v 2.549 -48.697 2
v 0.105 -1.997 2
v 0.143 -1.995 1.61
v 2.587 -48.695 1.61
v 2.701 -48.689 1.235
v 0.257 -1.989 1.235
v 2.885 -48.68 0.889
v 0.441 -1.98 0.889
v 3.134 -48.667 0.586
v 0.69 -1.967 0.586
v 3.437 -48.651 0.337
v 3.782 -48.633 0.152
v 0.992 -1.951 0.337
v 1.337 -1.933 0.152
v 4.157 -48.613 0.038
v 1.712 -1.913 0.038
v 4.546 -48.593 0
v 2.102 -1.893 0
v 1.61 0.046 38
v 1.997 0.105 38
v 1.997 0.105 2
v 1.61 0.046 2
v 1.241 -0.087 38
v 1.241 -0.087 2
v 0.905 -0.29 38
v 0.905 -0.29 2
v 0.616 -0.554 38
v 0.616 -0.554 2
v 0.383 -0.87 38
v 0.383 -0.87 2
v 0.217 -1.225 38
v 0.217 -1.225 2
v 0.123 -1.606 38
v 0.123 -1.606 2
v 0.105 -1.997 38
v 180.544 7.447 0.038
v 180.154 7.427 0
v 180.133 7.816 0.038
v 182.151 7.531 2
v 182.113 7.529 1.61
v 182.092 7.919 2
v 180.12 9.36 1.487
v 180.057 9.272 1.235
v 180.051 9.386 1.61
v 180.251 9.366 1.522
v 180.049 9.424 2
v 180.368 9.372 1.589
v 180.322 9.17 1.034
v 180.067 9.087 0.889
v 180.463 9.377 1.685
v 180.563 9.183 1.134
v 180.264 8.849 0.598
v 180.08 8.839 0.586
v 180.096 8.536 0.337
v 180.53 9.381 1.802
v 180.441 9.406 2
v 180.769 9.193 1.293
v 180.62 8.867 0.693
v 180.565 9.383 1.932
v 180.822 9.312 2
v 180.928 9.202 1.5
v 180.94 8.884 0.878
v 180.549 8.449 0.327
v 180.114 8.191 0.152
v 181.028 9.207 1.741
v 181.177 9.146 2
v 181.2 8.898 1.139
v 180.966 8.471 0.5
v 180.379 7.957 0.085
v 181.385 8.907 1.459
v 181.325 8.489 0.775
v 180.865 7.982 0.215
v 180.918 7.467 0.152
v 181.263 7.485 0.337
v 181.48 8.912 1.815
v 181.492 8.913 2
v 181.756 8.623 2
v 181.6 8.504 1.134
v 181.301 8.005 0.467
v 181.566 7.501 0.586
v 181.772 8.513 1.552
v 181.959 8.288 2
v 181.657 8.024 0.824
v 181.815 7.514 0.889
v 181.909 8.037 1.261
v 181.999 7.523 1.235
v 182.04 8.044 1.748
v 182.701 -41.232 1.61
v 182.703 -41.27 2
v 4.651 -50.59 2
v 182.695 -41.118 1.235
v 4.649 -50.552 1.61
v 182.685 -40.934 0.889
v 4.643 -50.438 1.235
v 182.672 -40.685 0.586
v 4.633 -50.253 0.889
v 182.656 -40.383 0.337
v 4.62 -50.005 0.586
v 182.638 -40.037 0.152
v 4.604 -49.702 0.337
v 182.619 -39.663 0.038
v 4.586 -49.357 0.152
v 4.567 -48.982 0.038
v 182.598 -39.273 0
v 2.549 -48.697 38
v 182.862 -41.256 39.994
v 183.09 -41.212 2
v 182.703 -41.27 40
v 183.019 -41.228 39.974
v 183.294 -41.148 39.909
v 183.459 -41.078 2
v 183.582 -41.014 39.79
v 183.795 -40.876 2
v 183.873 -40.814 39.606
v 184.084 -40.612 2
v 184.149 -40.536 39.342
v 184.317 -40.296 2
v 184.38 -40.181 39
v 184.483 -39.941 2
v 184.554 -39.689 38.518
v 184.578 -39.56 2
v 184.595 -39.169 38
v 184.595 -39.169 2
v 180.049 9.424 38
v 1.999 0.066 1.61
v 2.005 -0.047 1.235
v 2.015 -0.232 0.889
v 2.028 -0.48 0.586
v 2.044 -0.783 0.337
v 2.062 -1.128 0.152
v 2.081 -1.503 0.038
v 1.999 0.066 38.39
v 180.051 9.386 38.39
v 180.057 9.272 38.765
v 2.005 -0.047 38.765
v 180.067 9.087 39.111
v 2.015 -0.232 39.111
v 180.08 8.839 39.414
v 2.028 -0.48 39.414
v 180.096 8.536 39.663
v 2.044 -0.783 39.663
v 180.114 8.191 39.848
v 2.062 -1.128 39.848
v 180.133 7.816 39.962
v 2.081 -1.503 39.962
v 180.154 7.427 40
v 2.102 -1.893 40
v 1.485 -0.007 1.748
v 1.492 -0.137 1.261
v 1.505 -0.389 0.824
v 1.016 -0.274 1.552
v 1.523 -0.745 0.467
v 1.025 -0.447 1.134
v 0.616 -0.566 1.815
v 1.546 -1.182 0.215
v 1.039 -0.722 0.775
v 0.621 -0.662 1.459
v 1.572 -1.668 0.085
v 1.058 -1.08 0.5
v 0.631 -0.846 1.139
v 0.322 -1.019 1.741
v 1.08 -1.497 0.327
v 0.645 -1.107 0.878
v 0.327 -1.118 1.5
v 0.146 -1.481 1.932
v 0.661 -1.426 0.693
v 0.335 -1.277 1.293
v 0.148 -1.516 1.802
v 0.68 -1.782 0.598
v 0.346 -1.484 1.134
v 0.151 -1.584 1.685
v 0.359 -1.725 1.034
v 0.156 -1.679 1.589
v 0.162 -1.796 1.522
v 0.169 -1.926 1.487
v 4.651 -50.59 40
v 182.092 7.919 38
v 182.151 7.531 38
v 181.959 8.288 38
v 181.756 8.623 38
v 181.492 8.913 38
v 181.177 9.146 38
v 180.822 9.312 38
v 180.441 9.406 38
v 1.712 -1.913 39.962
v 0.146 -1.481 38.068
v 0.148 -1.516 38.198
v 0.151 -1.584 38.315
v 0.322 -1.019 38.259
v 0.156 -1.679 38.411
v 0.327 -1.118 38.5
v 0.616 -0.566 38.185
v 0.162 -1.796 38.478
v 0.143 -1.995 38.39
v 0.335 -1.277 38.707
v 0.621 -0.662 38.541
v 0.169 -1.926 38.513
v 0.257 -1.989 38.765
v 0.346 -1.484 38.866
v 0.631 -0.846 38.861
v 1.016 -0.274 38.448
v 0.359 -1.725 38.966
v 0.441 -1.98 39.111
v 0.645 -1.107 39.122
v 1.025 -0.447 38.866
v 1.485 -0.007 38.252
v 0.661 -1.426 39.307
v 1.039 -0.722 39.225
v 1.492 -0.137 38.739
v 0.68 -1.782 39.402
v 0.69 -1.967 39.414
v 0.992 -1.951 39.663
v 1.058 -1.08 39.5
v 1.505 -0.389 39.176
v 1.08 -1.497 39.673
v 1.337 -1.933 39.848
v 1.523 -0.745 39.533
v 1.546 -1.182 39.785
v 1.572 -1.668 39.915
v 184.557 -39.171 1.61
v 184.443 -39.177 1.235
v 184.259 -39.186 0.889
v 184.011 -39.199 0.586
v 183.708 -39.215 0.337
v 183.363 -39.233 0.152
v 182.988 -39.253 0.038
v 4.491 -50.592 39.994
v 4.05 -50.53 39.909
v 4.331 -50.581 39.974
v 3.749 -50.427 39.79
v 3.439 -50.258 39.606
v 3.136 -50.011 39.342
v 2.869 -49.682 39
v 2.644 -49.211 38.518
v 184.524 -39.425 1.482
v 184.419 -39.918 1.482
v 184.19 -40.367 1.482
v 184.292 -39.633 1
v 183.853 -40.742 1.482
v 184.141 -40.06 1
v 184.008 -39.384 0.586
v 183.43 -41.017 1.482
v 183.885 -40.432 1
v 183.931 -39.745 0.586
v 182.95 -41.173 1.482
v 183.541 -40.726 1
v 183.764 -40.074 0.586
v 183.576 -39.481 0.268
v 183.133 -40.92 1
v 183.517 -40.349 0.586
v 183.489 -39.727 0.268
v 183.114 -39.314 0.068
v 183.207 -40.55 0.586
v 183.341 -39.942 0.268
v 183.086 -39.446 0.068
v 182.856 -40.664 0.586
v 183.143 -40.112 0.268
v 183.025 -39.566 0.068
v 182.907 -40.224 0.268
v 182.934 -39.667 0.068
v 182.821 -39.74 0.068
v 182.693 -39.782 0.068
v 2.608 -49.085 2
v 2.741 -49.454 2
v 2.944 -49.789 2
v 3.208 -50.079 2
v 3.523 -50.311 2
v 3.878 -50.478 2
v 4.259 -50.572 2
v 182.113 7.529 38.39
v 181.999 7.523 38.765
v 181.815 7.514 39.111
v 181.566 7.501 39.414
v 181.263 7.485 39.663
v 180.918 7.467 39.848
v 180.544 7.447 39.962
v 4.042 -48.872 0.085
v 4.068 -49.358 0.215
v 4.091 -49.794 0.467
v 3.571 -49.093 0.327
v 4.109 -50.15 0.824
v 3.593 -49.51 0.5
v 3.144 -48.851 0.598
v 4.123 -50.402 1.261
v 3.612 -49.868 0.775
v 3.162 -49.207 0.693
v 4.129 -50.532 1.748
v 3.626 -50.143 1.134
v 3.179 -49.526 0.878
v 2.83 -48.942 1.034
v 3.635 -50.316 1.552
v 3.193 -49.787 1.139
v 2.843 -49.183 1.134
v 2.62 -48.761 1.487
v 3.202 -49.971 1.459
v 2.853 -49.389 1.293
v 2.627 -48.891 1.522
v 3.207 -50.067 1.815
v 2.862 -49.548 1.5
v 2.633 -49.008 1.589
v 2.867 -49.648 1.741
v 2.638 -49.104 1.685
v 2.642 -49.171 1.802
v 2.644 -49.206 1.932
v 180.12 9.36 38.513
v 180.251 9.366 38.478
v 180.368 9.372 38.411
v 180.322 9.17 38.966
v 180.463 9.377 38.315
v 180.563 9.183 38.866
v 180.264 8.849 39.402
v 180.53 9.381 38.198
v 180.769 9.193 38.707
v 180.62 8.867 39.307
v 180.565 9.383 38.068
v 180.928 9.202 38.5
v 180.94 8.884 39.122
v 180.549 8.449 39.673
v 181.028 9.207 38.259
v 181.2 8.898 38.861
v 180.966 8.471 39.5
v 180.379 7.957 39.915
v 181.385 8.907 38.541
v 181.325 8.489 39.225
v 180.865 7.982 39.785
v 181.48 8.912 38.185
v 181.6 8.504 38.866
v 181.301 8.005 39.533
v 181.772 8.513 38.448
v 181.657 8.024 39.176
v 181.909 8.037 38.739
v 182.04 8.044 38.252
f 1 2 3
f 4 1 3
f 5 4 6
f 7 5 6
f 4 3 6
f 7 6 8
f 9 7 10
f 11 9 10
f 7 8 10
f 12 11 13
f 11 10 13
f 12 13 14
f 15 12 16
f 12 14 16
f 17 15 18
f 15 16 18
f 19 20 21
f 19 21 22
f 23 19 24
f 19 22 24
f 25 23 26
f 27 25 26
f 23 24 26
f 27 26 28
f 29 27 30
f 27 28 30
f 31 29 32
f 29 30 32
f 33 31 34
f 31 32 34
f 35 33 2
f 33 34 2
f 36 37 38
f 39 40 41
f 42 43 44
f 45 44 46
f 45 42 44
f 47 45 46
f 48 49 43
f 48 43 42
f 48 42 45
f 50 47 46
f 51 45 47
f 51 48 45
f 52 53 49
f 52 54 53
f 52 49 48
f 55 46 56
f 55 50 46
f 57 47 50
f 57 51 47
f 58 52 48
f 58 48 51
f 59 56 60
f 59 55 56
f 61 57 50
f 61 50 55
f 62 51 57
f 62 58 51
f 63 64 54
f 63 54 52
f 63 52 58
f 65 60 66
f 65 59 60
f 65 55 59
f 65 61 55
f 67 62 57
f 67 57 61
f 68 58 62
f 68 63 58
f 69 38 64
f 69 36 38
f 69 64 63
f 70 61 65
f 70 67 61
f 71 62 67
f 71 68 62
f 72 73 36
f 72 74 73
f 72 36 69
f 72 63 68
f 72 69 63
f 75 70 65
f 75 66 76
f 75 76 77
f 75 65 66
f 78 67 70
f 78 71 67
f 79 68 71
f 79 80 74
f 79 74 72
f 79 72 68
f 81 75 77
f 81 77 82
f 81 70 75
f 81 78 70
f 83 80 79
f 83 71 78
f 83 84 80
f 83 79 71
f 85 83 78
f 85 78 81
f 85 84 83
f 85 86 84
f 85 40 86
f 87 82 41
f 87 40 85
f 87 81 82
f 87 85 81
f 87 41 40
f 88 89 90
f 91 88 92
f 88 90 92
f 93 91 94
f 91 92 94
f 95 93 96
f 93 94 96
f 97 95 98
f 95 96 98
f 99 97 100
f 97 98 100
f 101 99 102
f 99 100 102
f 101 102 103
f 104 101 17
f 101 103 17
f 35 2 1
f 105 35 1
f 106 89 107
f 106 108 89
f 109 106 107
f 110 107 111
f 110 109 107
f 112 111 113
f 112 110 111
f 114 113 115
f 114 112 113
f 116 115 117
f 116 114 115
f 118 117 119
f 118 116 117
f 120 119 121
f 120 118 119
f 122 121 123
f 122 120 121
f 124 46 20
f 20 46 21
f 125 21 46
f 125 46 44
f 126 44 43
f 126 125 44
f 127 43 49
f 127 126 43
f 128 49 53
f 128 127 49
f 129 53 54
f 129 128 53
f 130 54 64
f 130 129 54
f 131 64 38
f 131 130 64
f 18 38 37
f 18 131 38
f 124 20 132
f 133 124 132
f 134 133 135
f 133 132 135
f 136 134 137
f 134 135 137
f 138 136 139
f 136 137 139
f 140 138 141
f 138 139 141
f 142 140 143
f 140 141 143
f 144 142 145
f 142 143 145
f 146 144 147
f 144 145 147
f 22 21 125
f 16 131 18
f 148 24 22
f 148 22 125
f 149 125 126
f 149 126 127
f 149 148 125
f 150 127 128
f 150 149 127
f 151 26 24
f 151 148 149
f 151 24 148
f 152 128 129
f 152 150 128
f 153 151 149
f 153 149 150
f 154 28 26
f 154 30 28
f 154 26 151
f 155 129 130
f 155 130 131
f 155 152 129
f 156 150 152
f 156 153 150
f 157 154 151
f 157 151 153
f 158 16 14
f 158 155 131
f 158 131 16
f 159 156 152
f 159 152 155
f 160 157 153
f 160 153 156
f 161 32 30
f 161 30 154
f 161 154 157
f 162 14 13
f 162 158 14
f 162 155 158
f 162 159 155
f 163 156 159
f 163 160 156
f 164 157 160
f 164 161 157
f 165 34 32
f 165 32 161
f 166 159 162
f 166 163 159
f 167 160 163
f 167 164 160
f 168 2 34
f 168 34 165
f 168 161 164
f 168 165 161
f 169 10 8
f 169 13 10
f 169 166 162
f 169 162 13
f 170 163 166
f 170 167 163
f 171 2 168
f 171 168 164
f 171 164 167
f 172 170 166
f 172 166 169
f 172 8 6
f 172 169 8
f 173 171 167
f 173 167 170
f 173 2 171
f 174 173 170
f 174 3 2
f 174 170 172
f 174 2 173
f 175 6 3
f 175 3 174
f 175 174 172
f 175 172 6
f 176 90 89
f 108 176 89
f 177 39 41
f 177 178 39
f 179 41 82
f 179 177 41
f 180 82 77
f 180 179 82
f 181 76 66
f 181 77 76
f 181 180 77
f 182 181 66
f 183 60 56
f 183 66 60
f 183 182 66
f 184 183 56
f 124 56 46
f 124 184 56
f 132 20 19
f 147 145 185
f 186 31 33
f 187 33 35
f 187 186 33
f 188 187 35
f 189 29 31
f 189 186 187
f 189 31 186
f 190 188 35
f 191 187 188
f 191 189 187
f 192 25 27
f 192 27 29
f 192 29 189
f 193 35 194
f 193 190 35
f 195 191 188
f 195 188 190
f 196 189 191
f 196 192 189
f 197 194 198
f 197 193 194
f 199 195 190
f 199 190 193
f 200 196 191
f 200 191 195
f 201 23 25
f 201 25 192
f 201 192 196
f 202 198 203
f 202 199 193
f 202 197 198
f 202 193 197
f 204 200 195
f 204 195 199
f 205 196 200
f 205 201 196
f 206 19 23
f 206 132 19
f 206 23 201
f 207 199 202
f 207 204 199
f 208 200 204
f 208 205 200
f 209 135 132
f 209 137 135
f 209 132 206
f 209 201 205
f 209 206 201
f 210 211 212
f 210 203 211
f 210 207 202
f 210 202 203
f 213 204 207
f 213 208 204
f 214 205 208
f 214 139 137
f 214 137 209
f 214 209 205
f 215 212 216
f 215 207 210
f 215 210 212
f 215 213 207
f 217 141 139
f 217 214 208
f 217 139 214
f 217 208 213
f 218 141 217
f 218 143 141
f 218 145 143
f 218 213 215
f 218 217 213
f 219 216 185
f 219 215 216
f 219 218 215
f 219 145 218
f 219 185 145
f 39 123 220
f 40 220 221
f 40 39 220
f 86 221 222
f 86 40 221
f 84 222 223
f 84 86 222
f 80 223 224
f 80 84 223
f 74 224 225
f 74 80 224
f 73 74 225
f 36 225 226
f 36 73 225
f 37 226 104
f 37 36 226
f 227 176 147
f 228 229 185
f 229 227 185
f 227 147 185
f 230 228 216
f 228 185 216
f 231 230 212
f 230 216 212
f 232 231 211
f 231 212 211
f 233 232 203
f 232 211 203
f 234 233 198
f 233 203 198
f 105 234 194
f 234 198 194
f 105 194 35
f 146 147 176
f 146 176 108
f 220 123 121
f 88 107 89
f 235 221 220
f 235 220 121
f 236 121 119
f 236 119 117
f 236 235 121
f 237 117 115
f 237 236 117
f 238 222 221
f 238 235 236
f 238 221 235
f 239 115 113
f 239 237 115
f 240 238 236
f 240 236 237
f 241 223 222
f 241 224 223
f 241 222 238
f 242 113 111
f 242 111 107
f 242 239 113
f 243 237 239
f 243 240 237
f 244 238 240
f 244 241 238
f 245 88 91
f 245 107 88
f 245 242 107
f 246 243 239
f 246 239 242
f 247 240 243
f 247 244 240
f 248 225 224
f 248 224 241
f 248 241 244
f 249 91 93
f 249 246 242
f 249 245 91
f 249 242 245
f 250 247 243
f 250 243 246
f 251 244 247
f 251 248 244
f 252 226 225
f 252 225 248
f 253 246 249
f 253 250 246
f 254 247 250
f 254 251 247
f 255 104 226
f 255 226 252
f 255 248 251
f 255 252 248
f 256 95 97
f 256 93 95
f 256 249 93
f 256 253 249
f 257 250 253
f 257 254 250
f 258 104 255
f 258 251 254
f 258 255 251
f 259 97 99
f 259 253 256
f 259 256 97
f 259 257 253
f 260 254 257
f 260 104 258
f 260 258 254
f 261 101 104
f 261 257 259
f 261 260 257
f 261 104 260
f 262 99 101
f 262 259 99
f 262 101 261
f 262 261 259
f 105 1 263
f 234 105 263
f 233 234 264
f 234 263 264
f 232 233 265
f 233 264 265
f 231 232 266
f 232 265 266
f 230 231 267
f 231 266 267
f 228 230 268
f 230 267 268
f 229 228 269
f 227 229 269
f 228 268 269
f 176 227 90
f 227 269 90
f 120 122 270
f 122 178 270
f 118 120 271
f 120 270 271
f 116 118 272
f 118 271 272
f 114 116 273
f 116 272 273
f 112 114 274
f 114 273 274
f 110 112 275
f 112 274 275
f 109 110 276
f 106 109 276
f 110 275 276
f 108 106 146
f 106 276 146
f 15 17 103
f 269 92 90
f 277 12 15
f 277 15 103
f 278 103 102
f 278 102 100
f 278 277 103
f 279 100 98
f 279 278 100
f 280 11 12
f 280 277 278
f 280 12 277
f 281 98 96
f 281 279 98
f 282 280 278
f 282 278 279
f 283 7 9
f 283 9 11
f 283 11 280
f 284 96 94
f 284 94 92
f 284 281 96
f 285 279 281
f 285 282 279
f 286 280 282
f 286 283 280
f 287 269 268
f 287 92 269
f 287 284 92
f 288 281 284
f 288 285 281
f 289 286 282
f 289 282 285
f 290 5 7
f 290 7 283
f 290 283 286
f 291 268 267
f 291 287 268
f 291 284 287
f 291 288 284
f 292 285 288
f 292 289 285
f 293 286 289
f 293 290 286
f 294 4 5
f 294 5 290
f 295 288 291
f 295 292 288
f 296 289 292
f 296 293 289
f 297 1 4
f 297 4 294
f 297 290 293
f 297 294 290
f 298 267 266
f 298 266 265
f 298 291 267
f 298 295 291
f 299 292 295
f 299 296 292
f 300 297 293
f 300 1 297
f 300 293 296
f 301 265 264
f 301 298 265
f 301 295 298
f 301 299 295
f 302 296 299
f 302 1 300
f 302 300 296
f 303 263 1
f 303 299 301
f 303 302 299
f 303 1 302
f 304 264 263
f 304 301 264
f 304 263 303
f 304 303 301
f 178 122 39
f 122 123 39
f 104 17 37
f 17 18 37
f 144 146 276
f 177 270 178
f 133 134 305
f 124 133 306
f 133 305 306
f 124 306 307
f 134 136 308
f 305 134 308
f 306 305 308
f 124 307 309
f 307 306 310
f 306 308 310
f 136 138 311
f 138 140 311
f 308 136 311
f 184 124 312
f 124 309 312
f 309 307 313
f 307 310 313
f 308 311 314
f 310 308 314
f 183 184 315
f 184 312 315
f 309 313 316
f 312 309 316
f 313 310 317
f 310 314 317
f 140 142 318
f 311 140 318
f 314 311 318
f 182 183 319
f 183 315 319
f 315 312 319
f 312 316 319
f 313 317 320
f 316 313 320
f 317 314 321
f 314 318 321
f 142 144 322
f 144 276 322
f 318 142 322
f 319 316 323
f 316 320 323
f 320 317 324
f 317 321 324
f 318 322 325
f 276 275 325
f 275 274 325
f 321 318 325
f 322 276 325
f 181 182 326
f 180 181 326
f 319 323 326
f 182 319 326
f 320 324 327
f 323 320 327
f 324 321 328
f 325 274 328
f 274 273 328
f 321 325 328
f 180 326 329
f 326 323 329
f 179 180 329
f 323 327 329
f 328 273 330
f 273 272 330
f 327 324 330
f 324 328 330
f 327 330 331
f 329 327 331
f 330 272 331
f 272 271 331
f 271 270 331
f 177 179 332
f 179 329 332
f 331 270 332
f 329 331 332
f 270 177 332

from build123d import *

# Parameters (mm, degrees)
BOSS_EXTRUDE1_DEPTH = 40
FILLET1_R           = 2
FILLET2_R           = 2


with BuildPart() as part:
    # Sketch1 → Boss-Extrude1 (new body)
    with BuildSketch(Plane.XY):
        Polygon((0, 0), (2.6534308254274332, -50.694494191060826), (184.70003032872677, -41.165884299703535), (182.04659950329932, 9.528609891357288), align=None)
    extrude(amount=BOSS_EXTRUDE1_DEPTH)

    # Fillet1
    fillet1_edges = [part.edges().sort_by_distance(p)[0] for p in [
        (183.37331491601304, -15.818637204173122, 40),
        (91.02329975164966, 4.764304945678644, 40),
        (183.37331491601304, -15.818637204173122, 0),
        (91.02329975164966, 4.764304945678644, 0),
        (182.04659950329932, 9.528609891357288, 20),
        (184.70003032872677, -41.165884299703535, 20),
    ]]
    fillet(fillet1_edges, radius=FILLET1_R)

    # Fillet2
    # the kernel refuses this fillet: 2 mm, written as the material it takes off along each edge
    with BuildSketch(Plane(origin=(182.59822426289585, -39.27315841843169, 2), x_dir=(0.052270046139774824, -0.9986329867756952, 0), z_dir=(0, 0, -1))) as fillet2_piece_1_section:
        Polygon((0, 0), (FILLET2_R, 0), (FILLET2_R, -FILLET2_R), (-6.3e-16, -FILLET2_R), align=None)
    fillet2_piece_1 = extrude(amount=FILLET2_R, mode=Mode.PRIVATE)
    fillet2_piece_1 = fillet2_piece_1 - Plane(origin=(182.59822426289585, -39.27315841843169, 2), x_dir=(-0.7431006609440385, 0.6691796527873013, 0), z_dir=(0, 0, -1)) * Sphere(FILLET2_R, mode=Mode.PRIVATE)
    add(fillet2_piece_1, mode=Mode.SUBTRACT)
    with BuildSketch(Plane(origin=(4.546156706699275, -48.5926881252299, 2), x_dir=(0, 0, -1), z_dir=(-0.9986329867756953, -0.052270046139774824, 0))) as fillet2_piece_2_section:
        Polygon((0, 0), (FILLET2_R, 0), (FILLET2_R, FILLET2_R), (0, FILLET2_R), align=None)
    fillet2_piece_2 = extrude(amount=FILLET2_R, mode=Mode.PRIVATE)
    fillet2_piece_2 = fillet2_piece_2 - Plane(origin=(4.546156706699275, -48.5926881252299, 2), x_dir=(-0.0369605040783685, 0.7061401568656699, 0.7071067811865475), z_dir=(-0.9986329867756953, -0.052270046139774824, 0)) * Sphere(FILLET2_R, mode=Mode.PRIVATE)
    add(fillet2_piece_2, mode=Mode.SUBTRACT)
    with BuildSketch(Plane(origin=(0.1045400922795495, -1.9972659735513878, 0), x_dir=(-5e-17, 0, 1), z_dir=(0.052270046139774824, -0.9986329867756953, 0))) as fillet2_piece_3:
        with BuildLine():
            CenterArc((FILLET2_R, -FILLET2_R), FILLET2_R, 90, 90.00000000000006)
            Line((-3.3e-16, -FILLET2_R), (0, 0))
            Line((0, 0), (FILLET2_R, 0))
        make_face()
    extrude(amount=46.76388909877601, mode=Mode.SUBTRACT)
    with BuildSketch(Plane(origin=(0.1045400922795495, -1.9972659735513878, 40), x_dir=(-5e-17, 0, -1), z_dir=(0.052270046139774824, -0.9986329867756953, 0))) as fillet2_piece_4:
        with BuildLine():
            CenterArc((FILLET2_R, FILLET2_R), FILLET2_R, 179.99999999999994, 90.00000000000006)
            Line((-1.1e-16, FILLET2_R), (0, 0))
            Line((0, 0), (FILLET2_R, 0))
        make_face()
    extrude(amount=53.763889098776026, mode=Mode.SUBTRACT)
    with BuildSketch(Plane(origin=(0, 0, 1.9999999999999996), x_dir=(0.052270046139775025, -0.9986329867756953, 0), z_dir=(0, 0, 1))) as fillet2_piece_5:
        with BuildLine():
            CenterArc((FILLET2_R, FILLET2_R), FILLET2_R, 180.00000000000034, 89.99999999999966)
            Line((9e-16, FILLET2_R), (0, 0))
            Line((0, 0), (FILLET2_R, 0))
        make_face()
    extrude(amount=36, mode=Mode.SUBTRACT)
    with BuildSketch(Plane(origin=(0.1045400922795352, -1.9972659735513885, 38), x_dir=(-0.05227004613977481, 0.9986329867756952, 0), z_dir=(0, 0, -1))) as fillet2_piece_6:
        with BuildLine():
            CenterArc((2 - FILLET2_R, FILLET2_R), FILLET2_R, 270, 89.99999999999885)
            Line((1.9999999999999998, FILLET2_R), (2, 0))
            Line((2, 0), (2 - FILLET2_R, 1.42e-14))
        make_face()
    revolve(axis=Axis((0.1045400922795352, -1.9972659735513885, 38), (0.9986329867756952, 0.05227004613977481, 0)), revolution_arc=90, mode=Mode.SUBTRACT)
    with BuildSketch(Plane(origin=(0.1045400922795352, -1.9972659735513885, 1.9999999999999996), x_dir=(-0.05227004613977481, 0.9986329867756952, 0), z_dir=(1e-17, -1.1e-16, 1))) as fillet2_piece_7:
        with BuildLine():
            CenterArc((2 - FILLET2_R, -FILLET2_R), FILLET2_R, 1.15136e-12, 89.99999999999886)
            Line((1.9999999999999998, -FILLET2_R), (2, 0))
            Line((2, 0), (2 - FILLET2_R, -1.42e-14))
        make_face()
    revolve(axis=Axis((0.1045400922795352, -1.9972659735513885, 1.9999999999999996), (-0.9986329867756952, -0.05227004613977481, 0)), revolution_arc=90, mode=Mode.SUBTRACT)
    with BuildSketch(Plane(origin=(4.650696798978822, -50.58995409878128, 0), x_dir=(-0.05227004613977483, 0.9986329867756953, 0), z_dir=(0.9986329867756952, 0.052270046139774824, 0))) as fillet2_piece_8:
        with BuildLine():
            CenterArc((FILLET2_R, FILLET2_R), FILLET2_R, 180, 90)
            Line((-5e-17, FILLET2_R), (0, 0))
            Line((0, 0), (FILLET2_R, 0))
        make_face()
    extrude(amount=178.29580027300779, mode=Mode.SUBTRACT)
    with BuildSketch(Plane(origin=(2.6534308254274332, -50.694494191060826, 2), x_dir=(-0.05227004613977479, 0.9986329867756952, 0), z_dir=(0, 0, 1))) as fillet2_piece_9:
        with BuildLine():
            CenterArc((FILLET2_R, -FILLET2_R), FILLET2_R, 90, 90)
            Line((-1.444e-14, -FILLET2_R), (0, 0))
            Line((0, 0), (FILLET2_R, 0))
        make_face()
    extrude(amount=43, mode=Mode.SUBTRACT)


solid = part.part
